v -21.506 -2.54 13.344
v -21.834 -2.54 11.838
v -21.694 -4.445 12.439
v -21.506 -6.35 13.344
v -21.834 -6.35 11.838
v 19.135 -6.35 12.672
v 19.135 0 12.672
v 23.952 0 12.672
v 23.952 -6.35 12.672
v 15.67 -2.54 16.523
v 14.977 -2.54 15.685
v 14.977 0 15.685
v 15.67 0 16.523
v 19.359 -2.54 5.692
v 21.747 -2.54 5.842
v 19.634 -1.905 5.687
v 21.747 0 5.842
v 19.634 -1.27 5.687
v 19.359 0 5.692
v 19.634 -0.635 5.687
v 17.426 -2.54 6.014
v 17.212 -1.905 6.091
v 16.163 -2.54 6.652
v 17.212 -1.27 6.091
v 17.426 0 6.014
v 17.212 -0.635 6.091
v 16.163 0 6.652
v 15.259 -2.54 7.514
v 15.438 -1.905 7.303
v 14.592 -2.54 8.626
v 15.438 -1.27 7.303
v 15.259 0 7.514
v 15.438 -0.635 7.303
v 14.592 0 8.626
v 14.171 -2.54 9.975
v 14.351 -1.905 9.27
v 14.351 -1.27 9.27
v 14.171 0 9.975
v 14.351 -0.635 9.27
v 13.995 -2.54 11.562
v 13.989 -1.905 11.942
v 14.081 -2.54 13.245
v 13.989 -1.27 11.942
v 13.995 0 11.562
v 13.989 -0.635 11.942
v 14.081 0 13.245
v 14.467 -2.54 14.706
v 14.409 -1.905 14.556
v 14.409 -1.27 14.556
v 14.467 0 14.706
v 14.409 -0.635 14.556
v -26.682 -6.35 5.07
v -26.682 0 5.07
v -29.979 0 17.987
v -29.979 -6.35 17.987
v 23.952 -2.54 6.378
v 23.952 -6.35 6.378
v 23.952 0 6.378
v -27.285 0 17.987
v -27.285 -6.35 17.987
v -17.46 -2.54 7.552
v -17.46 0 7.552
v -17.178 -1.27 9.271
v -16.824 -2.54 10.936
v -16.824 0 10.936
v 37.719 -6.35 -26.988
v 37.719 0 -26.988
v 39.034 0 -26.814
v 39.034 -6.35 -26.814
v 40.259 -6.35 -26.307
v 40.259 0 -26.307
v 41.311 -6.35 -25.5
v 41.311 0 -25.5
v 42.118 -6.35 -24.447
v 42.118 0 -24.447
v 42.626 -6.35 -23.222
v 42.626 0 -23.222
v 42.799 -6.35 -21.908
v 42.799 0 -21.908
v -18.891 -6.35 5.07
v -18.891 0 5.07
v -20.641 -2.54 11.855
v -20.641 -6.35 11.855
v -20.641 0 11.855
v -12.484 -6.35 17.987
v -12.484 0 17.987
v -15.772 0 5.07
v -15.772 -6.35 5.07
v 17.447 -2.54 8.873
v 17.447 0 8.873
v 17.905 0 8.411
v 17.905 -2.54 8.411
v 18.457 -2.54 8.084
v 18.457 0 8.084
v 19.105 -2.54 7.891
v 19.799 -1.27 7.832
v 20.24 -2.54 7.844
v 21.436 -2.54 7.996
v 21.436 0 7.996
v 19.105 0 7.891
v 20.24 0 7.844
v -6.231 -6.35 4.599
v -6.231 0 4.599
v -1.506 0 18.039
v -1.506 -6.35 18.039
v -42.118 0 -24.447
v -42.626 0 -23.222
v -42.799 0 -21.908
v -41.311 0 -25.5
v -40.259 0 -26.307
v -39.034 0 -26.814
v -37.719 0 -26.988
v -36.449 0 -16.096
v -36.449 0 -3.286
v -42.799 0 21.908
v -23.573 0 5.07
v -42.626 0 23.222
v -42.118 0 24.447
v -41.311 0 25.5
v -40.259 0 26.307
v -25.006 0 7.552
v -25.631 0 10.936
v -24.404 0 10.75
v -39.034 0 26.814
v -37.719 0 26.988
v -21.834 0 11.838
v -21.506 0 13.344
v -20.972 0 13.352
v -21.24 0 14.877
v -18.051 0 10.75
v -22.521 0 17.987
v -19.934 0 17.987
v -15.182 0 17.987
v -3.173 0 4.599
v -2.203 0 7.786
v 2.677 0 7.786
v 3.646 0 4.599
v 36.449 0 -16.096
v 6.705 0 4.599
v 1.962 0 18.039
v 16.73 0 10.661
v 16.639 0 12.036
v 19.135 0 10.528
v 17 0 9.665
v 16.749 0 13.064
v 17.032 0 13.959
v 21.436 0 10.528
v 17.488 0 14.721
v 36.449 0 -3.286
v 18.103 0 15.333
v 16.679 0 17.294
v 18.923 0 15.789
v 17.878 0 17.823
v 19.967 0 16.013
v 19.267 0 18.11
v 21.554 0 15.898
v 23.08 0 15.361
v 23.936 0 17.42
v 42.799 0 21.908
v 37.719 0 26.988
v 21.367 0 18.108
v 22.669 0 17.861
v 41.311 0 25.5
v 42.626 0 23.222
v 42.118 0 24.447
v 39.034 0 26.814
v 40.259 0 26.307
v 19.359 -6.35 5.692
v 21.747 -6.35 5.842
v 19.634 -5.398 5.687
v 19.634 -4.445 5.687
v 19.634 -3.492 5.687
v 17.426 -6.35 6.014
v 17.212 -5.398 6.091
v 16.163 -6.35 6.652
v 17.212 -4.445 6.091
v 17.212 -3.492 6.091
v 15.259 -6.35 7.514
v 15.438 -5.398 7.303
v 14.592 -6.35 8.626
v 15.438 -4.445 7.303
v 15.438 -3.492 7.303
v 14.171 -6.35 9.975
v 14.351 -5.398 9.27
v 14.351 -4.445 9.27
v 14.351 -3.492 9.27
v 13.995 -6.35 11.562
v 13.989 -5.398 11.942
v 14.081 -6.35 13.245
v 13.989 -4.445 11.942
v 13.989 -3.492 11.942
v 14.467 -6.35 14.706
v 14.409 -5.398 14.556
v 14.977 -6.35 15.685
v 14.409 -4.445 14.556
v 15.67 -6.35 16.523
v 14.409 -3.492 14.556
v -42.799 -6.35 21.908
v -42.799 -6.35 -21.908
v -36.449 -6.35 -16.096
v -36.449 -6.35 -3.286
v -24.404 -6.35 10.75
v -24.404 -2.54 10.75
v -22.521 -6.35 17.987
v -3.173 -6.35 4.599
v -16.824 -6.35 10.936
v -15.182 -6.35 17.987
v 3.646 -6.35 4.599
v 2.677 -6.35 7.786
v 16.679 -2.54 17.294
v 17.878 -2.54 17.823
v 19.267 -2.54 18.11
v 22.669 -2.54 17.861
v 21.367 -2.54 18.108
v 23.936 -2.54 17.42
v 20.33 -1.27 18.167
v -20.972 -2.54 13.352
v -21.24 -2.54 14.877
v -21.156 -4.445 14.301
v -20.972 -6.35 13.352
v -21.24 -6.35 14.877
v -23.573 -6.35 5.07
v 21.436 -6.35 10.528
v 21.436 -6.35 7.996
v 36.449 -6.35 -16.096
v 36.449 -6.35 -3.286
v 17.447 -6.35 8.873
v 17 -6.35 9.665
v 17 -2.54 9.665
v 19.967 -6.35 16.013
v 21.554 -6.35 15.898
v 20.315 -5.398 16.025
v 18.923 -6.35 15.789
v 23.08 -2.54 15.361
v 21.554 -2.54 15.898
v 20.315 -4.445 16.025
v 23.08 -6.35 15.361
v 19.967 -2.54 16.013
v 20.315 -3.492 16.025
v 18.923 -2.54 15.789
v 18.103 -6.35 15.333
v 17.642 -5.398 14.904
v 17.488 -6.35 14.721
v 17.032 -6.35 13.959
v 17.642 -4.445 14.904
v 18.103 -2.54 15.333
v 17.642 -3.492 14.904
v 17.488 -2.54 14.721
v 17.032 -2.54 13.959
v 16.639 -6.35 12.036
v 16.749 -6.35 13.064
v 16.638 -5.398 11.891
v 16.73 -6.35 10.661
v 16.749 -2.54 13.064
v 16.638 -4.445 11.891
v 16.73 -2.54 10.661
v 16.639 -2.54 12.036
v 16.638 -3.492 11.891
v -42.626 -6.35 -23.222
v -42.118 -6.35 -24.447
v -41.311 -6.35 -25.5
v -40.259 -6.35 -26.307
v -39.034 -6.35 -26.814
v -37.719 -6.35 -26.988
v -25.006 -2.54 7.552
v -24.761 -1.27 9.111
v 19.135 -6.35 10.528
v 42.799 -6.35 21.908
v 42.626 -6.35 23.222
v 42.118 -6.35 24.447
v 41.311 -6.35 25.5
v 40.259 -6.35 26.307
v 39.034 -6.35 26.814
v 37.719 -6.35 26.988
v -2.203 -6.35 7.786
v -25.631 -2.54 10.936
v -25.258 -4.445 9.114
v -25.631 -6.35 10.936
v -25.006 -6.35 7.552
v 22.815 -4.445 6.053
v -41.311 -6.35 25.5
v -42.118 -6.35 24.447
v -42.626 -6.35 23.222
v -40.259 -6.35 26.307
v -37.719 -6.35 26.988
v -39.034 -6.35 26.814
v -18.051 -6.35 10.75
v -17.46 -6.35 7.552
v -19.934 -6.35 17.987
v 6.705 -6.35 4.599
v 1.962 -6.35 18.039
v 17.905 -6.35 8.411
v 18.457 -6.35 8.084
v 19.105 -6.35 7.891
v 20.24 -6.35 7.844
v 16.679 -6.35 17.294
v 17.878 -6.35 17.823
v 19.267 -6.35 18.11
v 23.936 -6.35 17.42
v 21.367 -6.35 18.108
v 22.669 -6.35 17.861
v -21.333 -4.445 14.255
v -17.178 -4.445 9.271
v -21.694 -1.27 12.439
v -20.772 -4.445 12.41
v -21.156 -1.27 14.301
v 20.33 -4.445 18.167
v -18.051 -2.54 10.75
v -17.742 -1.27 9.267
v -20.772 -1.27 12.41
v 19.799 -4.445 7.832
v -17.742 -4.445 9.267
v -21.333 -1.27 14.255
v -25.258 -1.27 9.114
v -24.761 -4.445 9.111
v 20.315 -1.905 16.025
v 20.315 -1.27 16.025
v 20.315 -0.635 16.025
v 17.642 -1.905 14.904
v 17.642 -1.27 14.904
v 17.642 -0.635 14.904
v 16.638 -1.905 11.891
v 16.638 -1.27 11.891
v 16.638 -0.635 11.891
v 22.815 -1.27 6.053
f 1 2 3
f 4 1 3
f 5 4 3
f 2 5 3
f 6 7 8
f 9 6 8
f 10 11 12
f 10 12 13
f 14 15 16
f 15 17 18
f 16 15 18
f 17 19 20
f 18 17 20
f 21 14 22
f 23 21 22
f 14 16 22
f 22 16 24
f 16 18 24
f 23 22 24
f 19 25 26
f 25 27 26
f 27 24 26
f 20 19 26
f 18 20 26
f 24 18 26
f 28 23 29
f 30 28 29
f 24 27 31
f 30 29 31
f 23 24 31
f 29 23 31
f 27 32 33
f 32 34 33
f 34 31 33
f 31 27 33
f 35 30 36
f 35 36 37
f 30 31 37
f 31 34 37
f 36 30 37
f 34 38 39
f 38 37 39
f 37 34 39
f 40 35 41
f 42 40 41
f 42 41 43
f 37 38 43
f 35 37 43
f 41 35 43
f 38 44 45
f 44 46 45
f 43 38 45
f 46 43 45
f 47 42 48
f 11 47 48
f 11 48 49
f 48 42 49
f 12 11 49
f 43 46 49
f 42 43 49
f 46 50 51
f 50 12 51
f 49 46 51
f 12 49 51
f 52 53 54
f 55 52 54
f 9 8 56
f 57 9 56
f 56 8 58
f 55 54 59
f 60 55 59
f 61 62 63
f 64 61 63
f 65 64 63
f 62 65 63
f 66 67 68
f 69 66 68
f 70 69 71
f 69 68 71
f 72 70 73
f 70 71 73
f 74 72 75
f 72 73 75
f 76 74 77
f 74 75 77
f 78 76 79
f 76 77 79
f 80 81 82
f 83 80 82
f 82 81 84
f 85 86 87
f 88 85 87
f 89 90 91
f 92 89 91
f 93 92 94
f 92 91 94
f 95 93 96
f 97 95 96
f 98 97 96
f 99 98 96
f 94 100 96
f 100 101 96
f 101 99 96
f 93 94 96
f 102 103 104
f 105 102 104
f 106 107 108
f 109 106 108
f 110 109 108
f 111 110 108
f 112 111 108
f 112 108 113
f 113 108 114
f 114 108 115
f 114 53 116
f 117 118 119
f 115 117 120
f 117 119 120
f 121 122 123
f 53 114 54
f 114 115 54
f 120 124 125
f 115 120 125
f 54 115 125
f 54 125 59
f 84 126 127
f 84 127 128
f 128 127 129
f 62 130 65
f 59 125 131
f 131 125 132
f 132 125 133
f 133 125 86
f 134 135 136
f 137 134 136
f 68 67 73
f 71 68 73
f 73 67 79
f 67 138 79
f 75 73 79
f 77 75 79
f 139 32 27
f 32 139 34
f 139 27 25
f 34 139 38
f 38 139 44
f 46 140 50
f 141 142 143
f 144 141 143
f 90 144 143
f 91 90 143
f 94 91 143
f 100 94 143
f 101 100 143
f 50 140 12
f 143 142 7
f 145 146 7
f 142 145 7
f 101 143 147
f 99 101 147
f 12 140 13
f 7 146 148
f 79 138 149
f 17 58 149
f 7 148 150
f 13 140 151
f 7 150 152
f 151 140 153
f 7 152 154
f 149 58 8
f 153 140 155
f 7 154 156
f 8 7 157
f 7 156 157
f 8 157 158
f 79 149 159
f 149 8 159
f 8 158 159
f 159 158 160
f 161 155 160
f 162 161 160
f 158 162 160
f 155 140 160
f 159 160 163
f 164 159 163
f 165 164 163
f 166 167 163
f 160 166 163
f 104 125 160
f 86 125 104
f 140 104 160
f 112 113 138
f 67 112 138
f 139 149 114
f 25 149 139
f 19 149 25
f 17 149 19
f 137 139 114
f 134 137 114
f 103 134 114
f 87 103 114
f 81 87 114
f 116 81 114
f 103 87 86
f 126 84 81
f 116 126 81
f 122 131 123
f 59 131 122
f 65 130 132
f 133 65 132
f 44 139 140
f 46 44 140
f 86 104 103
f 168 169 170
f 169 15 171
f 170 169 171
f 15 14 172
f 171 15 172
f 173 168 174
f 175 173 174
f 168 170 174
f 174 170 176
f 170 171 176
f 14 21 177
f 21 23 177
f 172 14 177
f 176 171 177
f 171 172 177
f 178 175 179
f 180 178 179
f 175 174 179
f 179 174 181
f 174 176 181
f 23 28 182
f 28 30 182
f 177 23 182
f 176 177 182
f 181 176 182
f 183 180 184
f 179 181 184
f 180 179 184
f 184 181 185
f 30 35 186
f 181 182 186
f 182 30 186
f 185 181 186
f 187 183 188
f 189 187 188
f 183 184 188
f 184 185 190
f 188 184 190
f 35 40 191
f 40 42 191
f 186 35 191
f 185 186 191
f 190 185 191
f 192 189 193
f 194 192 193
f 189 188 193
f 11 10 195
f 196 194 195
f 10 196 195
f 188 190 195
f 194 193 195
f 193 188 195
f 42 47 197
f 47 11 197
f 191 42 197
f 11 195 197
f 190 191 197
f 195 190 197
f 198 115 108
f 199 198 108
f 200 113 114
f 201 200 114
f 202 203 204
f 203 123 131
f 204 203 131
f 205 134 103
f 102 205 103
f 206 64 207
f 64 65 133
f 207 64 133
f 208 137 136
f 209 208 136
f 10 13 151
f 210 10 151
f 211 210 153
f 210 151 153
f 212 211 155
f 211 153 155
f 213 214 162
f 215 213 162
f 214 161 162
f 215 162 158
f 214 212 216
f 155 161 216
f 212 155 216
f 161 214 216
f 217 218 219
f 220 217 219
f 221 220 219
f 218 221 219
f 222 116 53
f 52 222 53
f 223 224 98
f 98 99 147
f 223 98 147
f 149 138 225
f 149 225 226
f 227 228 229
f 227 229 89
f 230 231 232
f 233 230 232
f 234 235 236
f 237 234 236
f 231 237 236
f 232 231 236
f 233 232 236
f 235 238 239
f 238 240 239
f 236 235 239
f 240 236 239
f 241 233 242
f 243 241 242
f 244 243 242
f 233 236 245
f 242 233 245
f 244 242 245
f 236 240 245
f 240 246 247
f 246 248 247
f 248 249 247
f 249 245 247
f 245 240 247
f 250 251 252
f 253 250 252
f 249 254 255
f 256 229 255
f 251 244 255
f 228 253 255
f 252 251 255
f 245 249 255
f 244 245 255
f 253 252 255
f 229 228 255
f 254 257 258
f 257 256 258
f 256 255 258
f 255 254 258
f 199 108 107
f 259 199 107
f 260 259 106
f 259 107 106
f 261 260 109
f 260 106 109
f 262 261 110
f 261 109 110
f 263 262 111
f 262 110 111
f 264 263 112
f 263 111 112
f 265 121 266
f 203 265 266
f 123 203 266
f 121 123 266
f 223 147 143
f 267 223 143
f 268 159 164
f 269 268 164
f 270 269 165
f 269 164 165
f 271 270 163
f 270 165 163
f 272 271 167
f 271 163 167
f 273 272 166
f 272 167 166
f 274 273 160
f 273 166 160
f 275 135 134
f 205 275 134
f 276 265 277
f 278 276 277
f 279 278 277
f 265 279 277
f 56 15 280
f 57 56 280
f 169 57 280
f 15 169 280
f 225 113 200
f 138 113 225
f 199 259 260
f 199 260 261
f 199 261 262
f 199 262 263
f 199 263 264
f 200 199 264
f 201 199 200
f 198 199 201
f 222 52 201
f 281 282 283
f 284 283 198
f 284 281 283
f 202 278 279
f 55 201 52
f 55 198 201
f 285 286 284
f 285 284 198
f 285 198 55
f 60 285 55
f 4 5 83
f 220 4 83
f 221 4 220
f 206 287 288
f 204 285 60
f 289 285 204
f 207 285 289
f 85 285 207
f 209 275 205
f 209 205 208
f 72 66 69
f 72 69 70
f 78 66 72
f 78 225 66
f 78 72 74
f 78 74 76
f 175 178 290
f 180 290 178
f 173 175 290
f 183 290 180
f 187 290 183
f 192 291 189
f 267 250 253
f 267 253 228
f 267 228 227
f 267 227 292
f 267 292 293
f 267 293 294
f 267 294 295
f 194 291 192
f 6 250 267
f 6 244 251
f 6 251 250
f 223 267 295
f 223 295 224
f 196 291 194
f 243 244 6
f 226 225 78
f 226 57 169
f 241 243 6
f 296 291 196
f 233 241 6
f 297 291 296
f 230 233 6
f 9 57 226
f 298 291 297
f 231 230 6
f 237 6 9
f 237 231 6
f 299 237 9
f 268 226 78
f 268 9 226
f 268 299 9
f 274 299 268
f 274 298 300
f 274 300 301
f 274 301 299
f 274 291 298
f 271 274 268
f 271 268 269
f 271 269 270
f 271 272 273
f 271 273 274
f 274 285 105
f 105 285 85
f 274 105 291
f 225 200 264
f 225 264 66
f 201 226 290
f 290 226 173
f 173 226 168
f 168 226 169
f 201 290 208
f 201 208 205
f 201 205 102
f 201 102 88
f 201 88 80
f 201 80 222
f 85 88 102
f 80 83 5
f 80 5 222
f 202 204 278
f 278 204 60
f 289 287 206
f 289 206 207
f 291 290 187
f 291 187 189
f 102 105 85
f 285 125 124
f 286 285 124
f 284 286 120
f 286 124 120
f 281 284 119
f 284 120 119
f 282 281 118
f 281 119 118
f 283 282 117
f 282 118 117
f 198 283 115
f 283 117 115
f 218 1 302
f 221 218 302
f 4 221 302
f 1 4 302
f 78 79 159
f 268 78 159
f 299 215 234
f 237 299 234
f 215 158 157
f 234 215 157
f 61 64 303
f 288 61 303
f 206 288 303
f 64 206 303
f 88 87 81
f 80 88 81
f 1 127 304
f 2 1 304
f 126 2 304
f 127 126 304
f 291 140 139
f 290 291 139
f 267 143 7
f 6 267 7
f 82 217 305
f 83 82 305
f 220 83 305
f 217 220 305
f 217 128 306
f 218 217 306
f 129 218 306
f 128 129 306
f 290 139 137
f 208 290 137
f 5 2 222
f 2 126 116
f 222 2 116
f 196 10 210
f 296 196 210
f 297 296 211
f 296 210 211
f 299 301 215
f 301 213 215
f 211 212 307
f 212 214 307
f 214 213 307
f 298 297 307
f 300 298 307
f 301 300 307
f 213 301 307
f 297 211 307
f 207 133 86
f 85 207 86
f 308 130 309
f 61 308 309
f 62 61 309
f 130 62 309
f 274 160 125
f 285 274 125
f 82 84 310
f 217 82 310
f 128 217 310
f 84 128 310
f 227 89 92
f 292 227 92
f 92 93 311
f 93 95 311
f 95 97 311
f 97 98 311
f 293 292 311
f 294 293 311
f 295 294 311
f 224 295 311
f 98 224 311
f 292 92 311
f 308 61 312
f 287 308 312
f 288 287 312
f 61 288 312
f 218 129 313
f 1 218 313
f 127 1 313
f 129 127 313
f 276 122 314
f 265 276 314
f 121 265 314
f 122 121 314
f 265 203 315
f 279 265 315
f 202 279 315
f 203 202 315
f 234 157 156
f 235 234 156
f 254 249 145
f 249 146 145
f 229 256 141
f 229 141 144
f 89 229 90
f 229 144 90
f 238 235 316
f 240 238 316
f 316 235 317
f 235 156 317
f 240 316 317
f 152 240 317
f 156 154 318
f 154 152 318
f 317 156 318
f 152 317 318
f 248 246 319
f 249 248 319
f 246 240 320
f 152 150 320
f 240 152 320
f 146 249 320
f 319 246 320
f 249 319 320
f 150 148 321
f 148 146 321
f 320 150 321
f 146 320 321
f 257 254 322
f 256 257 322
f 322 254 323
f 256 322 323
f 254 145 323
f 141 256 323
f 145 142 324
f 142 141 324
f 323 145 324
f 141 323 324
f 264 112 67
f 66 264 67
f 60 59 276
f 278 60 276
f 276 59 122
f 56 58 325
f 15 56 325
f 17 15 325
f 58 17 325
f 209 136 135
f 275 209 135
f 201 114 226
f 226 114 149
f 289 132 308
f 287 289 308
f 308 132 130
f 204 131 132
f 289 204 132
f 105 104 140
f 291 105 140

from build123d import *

# Parameters (mm, degrees)
F0_W     = 72.898
F0_H     = 12.8099111192
F1_DEPTH = 2.54
F2_DEPTH = 6.35


with BuildPart() as f1:
    # F0 (on Front) → F1 (new body)
    with BuildSketch(Plane.XZ):
        with BuildLine():
            Line((37.719, 26.9875), (-37.719, 26.9875))
            ThreePointArc((-37.719, 26.9875), (-41.3111024484, 25.4996024484), (-42.799, 21.9075))
            Line((-42.799, 21.9075), (-42.799, -21.9075))
            ThreePointArc((-42.799, -21.9075), (-41.3111024484, -25.4996024484), (-37.719, -26.9875))
            Line((-37.719, -26.9875), (37.719, -26.9875))
            ThreePointArc((37.719, -26.9875), (41.3111024484, -25.4996024484), (42.799, -21.9075))
            Line((42.799, -21.9075), (42.799, 21.9075))
            ThreePointArc((42.799, 21.9075), (41.3111024484, 25.4996024484), (37.719, 26.9875))
        make_face()
        with Locations((0, -9.6914345084)):
            Rectangle(F0_W, F0_H, mode=Mode.SUBTRACT)
        with BuildLine():
            Line((-12.4844893827, 17.9872417715), (-15.7724463003, 5.0700662284))
            Line((-15.7724463003, 5.0700662284), (-18.890775174, 5.0700662284))
            Line((-18.890775174, 5.0700662284), (-20.6407711603, 11.8551879844))
            add(Edge.make_bspline(
                [(-20.6407711603, 11.8551879844), (-20.7368937185, 12.2170611447), (-20.9715458459, 13.3521554719)],
                knots=[0, 0, 0, 1, 1, 1], degree=2))
            add(Edge.make_bspline(
                [(-20.9715458459, 13.3521554719), (-21.2061979733, 14.487249799), (-21.2401235821, 14.8773942999)],
                knots=[0, 0, 0, 1, 1, 1], degree=2))
            add(Edge.make_bspline(
                [(-21.2401235821, 14.8773942999), (-21.2938391293, 14.3996086429), (-21.5058741842, 13.3436740697)],
                knots=[0, 0, 0, 1, 1, 1], degree=2))
            add(Edge.make_bspline(
                [(-21.5058741842, 13.3436740697), (-21.7179092391, 12.2877394964), (-21.8338217357, 11.83822518)],
                knots=[0, 0, 0, 1, 1, 1], degree=2))
            Line((-21.8338217357, 11.83822518), (-23.5725091857, 5.0700662284))
            Line((-23.5725091857, 5.0700662284), (-26.6823566572, 5.0700662284))
            Line((-26.6823566572, 5.0700662284), (-29.9787949771, 17.9872417715))
            Line((-29.9787949771, 17.9872417715), (-27.2845362131, 17.9872417715))
            Line((-27.2845362131, 17.9872417715), (-25.6306627851, 10.9363694133))
            add(Edge.make_bspline(
                [(-25.6306627851, 10.9363694133), (-25.1981112731, 8.9828197744), (-25.0058661567, 7.5522899375)],
                knots=[0, 0, 0, 1, 1, 1], degree=2))
            add(Edge.make_bspline(
                [(-25.0058661567, 7.5522899375), (-24.9521506095, 8.055519801), (-24.7613190601, 9.1114543743)],
                knots=[0, 0, 0, 1, 1, 1], degree=2))
            add(Edge.make_bspline(
                [(-24.7613190601, 9.1114543743), (-24.5704875107, 10.1673889476), (-24.4036866008, 10.749778565)],
                knots=[0, 0, 0, 1, 1, 1], degree=2))
            Line((-24.4036866008, 10.749778565), (-22.5208153135, 17.9872417715))
            Line((-22.5208153135, 17.9872417715), (-19.933987644, 17.9872417715))
            Line((-19.933987644, 17.9872417715), (-18.0511163567, 10.749778565))
            add(Edge.make_bspline(
                [(-18.0511163567, 10.749778565), (-17.9267224579, 10.2663386399), (-17.7415451766, 9.2669467479)],
                knots=[0, 0, 0, 1, 1, 1], degree=2))
            add(Edge.make_bspline(
                [(-17.7415451766, 9.2669467479), (-17.5563678953, 8.2675548559), (-17.4602453371, 7.5522899375)],
                knots=[0, 0, 0, 1, 1, 1], degree=2))
            add(Edge.make_bspline(
                [(-17.4602453371, 7.5522899375), (-17.3726041811, 8.2421106493), (-17.1775319306, 9.271187449)],
                knots=[0, 0, 0, 1, 1, 1], degree=2))
            add(Edge.make_bspline(
                [(-17.1775319306, 9.271187449), (-16.9824596801, 10.3002642487), (-16.8241401725, 10.9363694133)],
                knots=[0, 0, 0, 1, 1, 1], degree=2))
            Line((-16.8241401725, 10.9363694133), (-15.1815752807, 17.9872417715))
            Line((-15.1815752807, 17.9872417715), (-12.4844893827, 17.9872417715))
        make_face(mode=Mode.SUBTRACT)
        Polygon((6.7046481006, 4.5991937256), (3.6464380853, 4.5991937256), (2.6768331858, 7.7862938182), (-2.2034138309, 7.7862938182), (-3.1730187304, 4.5991937256), (-6.2312287457, 4.5991937256), (-1.5062356857, 18.0389136012), (1.962079121, 18.0389136012), align=None, mode=Mode.SUBTRACT)
        with BuildLine():
            Line((19.1349248409, 10.5282055244), (19.1349248409, 12.6722633137))
            Line((19.1349248409, 12.6722633137), (23.9517485981, 12.6722633137))
            Line((23.9517485981, 12.6722633137), (23.9517485981, 6.3782448466))
            add(Edge.make_bspline(
                [(23.9517485981, 6.3782448466), (22.7800887653, 5.9956620441), (21.7465838334, 5.841566193)],
                knots=[0, 0, 0, 1, 1, 1], degree=2))
            add(Edge.make_bspline(
                [(21.7465838334, 5.841566193), (20.7130789015, 5.687470342), (19.6344079443, 5.687470342)],
                knots=[0, 0, 0, 1, 1, 1], degree=2))
            add(Edge.make_bspline(
                [(19.6344079443, 5.687470342), (16.8872508759, 5.687470342), (15.4379528287, 7.3028199528)],
                knots=[0, 0, 0, 1, 1, 1], degree=2))
            add(Edge.make_bspline(
                [(15.4379528287, 7.3028199528), (13.9886547815, 8.9181695636), (13.9886547815, 11.9416364338)],
                knots=[0, 0, 0, 1, 1, 1], degree=2))
            add(Edge.make_bspline(
                [(13.9886547815, 11.9416364338), (13.9886547815, 14.8800849035), (15.6704250177, 16.523331177)],
                knots=[0, 0, 0, 1, 1, 1], degree=2))
            add(Edge.make_bspline(
                [(15.6704250177, 16.523331177), (17.352195254, 18.1665774505), (20.3304960989, 18.1665774505)],
                knots=[0, 0, 0, 1, 1, 1], degree=2))
            add(Edge.make_bspline(
                [(20.3304960989, 18.1665774505), (22.2009009114, 18.1665774505), (23.935807648, 17.4200096205)],
                knots=[0, 0, 0, 1, 1, 1], degree=2))
            Line((23.935807648, 17.4200096205), (23.0803099923, 15.3609702317))
            add(Edge.make_bspline(
                [(23.0803099923, 15.3609702317), (21.7518974834, 16.0251764861), (20.3145551488, 16.0251764861)],
                knots=[0, 0, 0, 1, 1, 1], degree=2))
            add(Edge.make_bspline(
                [(20.3145551488, 16.0251764861), (18.6460690376, 16.0251764861), (17.6417891809, 14.9039963286)],
                knots=[0, 0, 0, 1, 1, 1], degree=2))
            add(Edge.make_bspline(
                [(17.6417891809, 14.9039963286), (16.6375093242, 13.7828161711), (16.6375093242, 11.8911567585)],
                knots=[0, 0, 0, 1, 1, 1], degree=2))
            add(Edge.make_bspline(
                [(16.6375093242, 11.8911567585), (16.6375093242, 9.9144789453), (17.4465125421, 8.8730035383)],
                knots=[0, 0, 0, 1, 1, 1], degree=2))
            add(Edge.make_bspline(
                [(17.4465125421, 8.8730035383), (18.25551576, 7.8315281314), (19.7991310954, 7.8315281314)],
                knots=[0, 0, 0, 1, 1, 1], degree=2))
            add(Edge.make_bspline(
                [(19.7991310954, 7.8315281314), (20.6068059008, 7.8315281314), (21.4357353063, 7.9962512825)],
                knots=[0, 0, 0, 1, 1, 1], degree=2))
            Line((21.4357353063, 7.9962512825), (21.4357353063, 10.5282055244))
            Line((21.4357353063, 10.5282055244), (19.1349248409, 10.5282055244))
        make_face(mode=Mode.SUBTRACT)
    extrude(amount=F1_DEPTH)

    # F0 (on Front) → F2 (join)
    with BuildSketch(Plane.XZ):
        with BuildLine():
            Line((37.719, 26.9875), (-37.719, 26.9875))
            ThreePointArc((-37.719, 26.9875), (-41.3111024484, 25.4996024484), (-42.799, 21.9075))
            Line((-42.799, 21.9075), (-42.799, -21.9075))
            ThreePointArc((-42.799, -21.9075), (-41.3111024484, -25.4996024484), (-37.719, -26.9875))
            Line((-37.719, -26.9875), (37.719, -26.9875))
            ThreePointArc((37.719, -26.9875), (41.3111024484, -25.4996024484), (42.799, -21.9075))
            Line((42.799, -21.9075), (42.799, 21.9075))
            ThreePointArc((42.799, 21.9075), (41.3111024484, 25.4996024484), (37.719, 26.9875))
        make_face()
        with Locations((0, -9.6914345084)):
            Rectangle(F0_W, F0_H, mode=Mode.SUBTRACT)
        with BuildLine():
            Line((-12.4844893827, 17.9872417715), (-15.7724463003, 5.0700662284))
            Line((-15.7724463003, 5.0700662284), (-18.890775174, 5.0700662284))
            Line((-18.890775174, 5.0700662284), (-20.6407711603, 11.8551879844))
            add(Edge.make_bspline(
                [(-20.6407711603, 11.8551879844), (-20.7368937185, 12.2170611447), (-20.9715458459, 13.3521554719)],
                knots=[0, 0, 0, 1, 1, 1], degree=2))
            add(Edge.make_bspline(
                [(-20.9715458459, 13.3521554719), (-21.2061979733, 14.487249799), (-21.2401235821, 14.8773942999)],
                knots=[0, 0, 0, 1, 1, 1], degree=2))
            add(Edge.make_bspline(
                [(-21.2401235821, 14.8773942999), (-21.2938391293, 14.3996086429), (-21.5058741842, 13.3436740697)],
                knots=[0, 0, 0, 1, 1, 1], degree=2))
            add(Edge.make_bspline(
                [(-21.5058741842, 13.3436740697), (-21.7179092391, 12.2877394964), (-21.8338217357, 11.83822518)],
                knots=[0, 0, 0, 1, 1, 1], degree=2))
            Line((-21.8338217357, 11.83822518), (-23.5725091857, 5.0700662284))
            Line((-23.5725091857, 5.0700662284), (-26.6823566572, 5.0700662284))
            Line((-26.6823566572, 5.0700662284), (-29.9787949771, 17.9872417715))
            Line((-29.9787949771, 17.9872417715), (-27.2845362131, 17.9872417715))
            Line((-27.2845362131, 17.9872417715), (-25.6306627851, 10.9363694133))
            add(Edge.make_bspline(
                [(-25.6306627851, 10.9363694133), (-25.1981112731, 8.9828197744), (-25.0058661567, 7.5522899375)],
                knots=[0, 0, 0, 1, 1, 1], degree=2))
            add(Edge.make_bspline(
                [(-25.0058661567, 7.5522899375), (-24.9521506095, 8.055519801), (-24.7613190601, 9.1114543743)],
                knots=[0, 0, 0, 1, 1, 1], degree=2))
            add(Edge.make_bspline(
                [(-24.7613190601, 9.1114543743), (-24.5704875107, 10.1673889476), (-24.4036866008, 10.749778565)],
                knots=[0, 0, 0, 1, 1, 1], degree=2))
            Line((-24.4036866008, 10.749778565), (-22.5208153135, 17.9872417715))
            Line((-22.5208153135, 17.9872417715), (-19.933987644, 17.9872417715))
            Line((-19.933987644, 17.9872417715), (-18.0511163567, 10.749778565))
            add(Edge.make_bspline(
                [(-18.0511163567, 10.749778565), (-17.9267224579, 10.2663386399), (-17.7415451766, 9.2669467479)],
                knots=[0, 0, 0, 1, 1, 1], degree=2))
            add(Edge.make_bspline(
                [(-17.7415451766, 9.2669467479), (-17.5563678953, 8.2675548559), (-17.4602453371, 7.5522899375)],
                knots=[0, 0, 0, 1, 1, 1], degree=2))
            add(Edge.make_bspline(
                [(-17.4602453371, 7.5522899375), (-17.3726041811, 8.2421106493), (-17.1775319306, 9.271187449)],
                knots=[0, 0, 0, 1, 1, 1], degree=2))
            add(Edge.make_bspline(
                [(-17.1775319306, 9.271187449), (-16.9824596801, 10.3002642487), (-16.8241401725, 10.9363694133)],
                knots=[0, 0, 0, 1, 1, 1], degree=2))
            Line((-16.8241401725, 10.9363694133), (-15.1815752807, 17.9872417715))
            Line((-15.1815752807, 17.9872417715), (-12.4844893827, 17.9872417715))
        make_face(mode=Mode.SUBTRACT)
        Polygon((6.7046481006, 4.5991937256), (3.6464380853, 4.5991937256), (2.6768331858, 7.7862938182), (-2.2034138309, 7.7862938182), (-3.1730187304, 4.5991937256), (-6.2312287457, 4.5991937256), (-1.5062356857, 18.0389136012), (1.962079121, 18.0389136012), align=None, mode=Mode.SUBTRACT)
        with BuildLine():
            Line((19.1349248409, 10.5282055244), (19.1349248409, 12.6722633137))
            Line((19.1349248409, 12.6722633137), (23.9517485981, 12.6722633137))
            Line((23.9517485981, 12.6722633137), (23.9517485981, 6.3782448466))
            add(Edge.make_bspline(
                [(23.9517485981, 6.3782448466), (22.7800887653, 5.9956620441), (21.7465838334, 5.841566193)],
                knots=[0, 0, 0, 1, 1, 1], degree=2))
            add(Edge.make_bspline(
                [(21.7465838334, 5.841566193), (20.7130789015, 5.687470342), (19.6344079443, 5.687470342)],
                knots=[0, 0, 0, 1, 1, 1], degree=2))
            add(Edge.make_bspline(
                [(19.6344079443, 5.687470342), (16.8872508759, 5.687470342), (15.4379528287, 7.3028199528)],
                knots=[0, 0, 0, 1, 1, 1], degree=2))
            add(Edge.make_bspline(
                [(15.4379528287, 7.3028199528), (13.9886547815, 8.9181695636), (13.9886547815, 11.9416364338)],
                knots=[0, 0, 0, 1, 1, 1], degree=2))
            add(Edge.make_bspline(
                [(13.9886547815, 11.9416364338), (13.9886547815, 14.8800849035), (15.6704250177, 16.523331177)],
                knots=[0, 0, 0, 1, 1, 1], degree=2))
            add(Edge.make_bspline(
                [(15.6704250177, 16.523331177), (17.352195254, 18.1665774505), (20.3304960989, 18.1665774505)],
                knots=[0, 0, 0, 1, 1, 1], degree=2))
            add(Edge.make_bspline(
                [(20.3304960989, 18.1665774505), (22.2009009114, 18.1665774505), (23.935807648, 17.4200096205)],
                knots=[0, 0, 0, 1, 1, 1], degree=2))
            Line((23.935807648, 17.4200096205), (23.0803099923, 15.3609702317))
            add(Edge.make_bspline(
                [(23.0803099923, 15.3609702317), (21.7518974834, 16.0251764861), (20.3145551488, 16.0251764861)],
                knots=[0, 0, 0, 1, 1, 1], degree=2))
            add(Edge.make_bspline(
                [(20.3145551488, 16.0251764861), (18.6460690376, 16.0251764861), (17.6417891809, 14.9039963286)],
                knots=[0, 0, 0, 1, 1, 1], degree=2))
            add(Edge.make_bspline(
                [(17.6417891809, 14.9039963286), (16.6375093242, 13.7828161711), (16.6375093242, 11.8911567585)],
                knots=[0, 0, 0, 1, 1, 1], degree=2))
            add(Edge.make_bspline(
                [(16.6375093242, 11.8911567585), (16.6375093242, 9.9144789453), (17.4465125421, 8.8730035383)],
                knots=[0, 0, 0, 1, 1, 1], degree=2))
            add(Edge.make_bspline(
                [(17.4465125421, 8.8730035383), (18.25551576, 7.8315281314), (19.7991310954, 7.8315281314)],
                knots=[0, 0, 0, 1, 1, 1], degree=2))
            add(Edge.make_bspline(
                [(19.7991310954, 7.8315281314), (20.6068059008, 7.8315281314), (21.4357353063, 7.9962512825)],
                knots=[0, 0, 0, 1, 1, 1], degree=2))
            Line((21.4357353063, 7.9962512825), (21.4357353063, 10.5282055244))
            Line((21.4357353063, 10.5282055244), (19.1349248409, 10.5282055244))
        make_face(mode=Mode.SUBTRACT)
    extrude(amount=F2_DEPTH)


solid = f1.part
